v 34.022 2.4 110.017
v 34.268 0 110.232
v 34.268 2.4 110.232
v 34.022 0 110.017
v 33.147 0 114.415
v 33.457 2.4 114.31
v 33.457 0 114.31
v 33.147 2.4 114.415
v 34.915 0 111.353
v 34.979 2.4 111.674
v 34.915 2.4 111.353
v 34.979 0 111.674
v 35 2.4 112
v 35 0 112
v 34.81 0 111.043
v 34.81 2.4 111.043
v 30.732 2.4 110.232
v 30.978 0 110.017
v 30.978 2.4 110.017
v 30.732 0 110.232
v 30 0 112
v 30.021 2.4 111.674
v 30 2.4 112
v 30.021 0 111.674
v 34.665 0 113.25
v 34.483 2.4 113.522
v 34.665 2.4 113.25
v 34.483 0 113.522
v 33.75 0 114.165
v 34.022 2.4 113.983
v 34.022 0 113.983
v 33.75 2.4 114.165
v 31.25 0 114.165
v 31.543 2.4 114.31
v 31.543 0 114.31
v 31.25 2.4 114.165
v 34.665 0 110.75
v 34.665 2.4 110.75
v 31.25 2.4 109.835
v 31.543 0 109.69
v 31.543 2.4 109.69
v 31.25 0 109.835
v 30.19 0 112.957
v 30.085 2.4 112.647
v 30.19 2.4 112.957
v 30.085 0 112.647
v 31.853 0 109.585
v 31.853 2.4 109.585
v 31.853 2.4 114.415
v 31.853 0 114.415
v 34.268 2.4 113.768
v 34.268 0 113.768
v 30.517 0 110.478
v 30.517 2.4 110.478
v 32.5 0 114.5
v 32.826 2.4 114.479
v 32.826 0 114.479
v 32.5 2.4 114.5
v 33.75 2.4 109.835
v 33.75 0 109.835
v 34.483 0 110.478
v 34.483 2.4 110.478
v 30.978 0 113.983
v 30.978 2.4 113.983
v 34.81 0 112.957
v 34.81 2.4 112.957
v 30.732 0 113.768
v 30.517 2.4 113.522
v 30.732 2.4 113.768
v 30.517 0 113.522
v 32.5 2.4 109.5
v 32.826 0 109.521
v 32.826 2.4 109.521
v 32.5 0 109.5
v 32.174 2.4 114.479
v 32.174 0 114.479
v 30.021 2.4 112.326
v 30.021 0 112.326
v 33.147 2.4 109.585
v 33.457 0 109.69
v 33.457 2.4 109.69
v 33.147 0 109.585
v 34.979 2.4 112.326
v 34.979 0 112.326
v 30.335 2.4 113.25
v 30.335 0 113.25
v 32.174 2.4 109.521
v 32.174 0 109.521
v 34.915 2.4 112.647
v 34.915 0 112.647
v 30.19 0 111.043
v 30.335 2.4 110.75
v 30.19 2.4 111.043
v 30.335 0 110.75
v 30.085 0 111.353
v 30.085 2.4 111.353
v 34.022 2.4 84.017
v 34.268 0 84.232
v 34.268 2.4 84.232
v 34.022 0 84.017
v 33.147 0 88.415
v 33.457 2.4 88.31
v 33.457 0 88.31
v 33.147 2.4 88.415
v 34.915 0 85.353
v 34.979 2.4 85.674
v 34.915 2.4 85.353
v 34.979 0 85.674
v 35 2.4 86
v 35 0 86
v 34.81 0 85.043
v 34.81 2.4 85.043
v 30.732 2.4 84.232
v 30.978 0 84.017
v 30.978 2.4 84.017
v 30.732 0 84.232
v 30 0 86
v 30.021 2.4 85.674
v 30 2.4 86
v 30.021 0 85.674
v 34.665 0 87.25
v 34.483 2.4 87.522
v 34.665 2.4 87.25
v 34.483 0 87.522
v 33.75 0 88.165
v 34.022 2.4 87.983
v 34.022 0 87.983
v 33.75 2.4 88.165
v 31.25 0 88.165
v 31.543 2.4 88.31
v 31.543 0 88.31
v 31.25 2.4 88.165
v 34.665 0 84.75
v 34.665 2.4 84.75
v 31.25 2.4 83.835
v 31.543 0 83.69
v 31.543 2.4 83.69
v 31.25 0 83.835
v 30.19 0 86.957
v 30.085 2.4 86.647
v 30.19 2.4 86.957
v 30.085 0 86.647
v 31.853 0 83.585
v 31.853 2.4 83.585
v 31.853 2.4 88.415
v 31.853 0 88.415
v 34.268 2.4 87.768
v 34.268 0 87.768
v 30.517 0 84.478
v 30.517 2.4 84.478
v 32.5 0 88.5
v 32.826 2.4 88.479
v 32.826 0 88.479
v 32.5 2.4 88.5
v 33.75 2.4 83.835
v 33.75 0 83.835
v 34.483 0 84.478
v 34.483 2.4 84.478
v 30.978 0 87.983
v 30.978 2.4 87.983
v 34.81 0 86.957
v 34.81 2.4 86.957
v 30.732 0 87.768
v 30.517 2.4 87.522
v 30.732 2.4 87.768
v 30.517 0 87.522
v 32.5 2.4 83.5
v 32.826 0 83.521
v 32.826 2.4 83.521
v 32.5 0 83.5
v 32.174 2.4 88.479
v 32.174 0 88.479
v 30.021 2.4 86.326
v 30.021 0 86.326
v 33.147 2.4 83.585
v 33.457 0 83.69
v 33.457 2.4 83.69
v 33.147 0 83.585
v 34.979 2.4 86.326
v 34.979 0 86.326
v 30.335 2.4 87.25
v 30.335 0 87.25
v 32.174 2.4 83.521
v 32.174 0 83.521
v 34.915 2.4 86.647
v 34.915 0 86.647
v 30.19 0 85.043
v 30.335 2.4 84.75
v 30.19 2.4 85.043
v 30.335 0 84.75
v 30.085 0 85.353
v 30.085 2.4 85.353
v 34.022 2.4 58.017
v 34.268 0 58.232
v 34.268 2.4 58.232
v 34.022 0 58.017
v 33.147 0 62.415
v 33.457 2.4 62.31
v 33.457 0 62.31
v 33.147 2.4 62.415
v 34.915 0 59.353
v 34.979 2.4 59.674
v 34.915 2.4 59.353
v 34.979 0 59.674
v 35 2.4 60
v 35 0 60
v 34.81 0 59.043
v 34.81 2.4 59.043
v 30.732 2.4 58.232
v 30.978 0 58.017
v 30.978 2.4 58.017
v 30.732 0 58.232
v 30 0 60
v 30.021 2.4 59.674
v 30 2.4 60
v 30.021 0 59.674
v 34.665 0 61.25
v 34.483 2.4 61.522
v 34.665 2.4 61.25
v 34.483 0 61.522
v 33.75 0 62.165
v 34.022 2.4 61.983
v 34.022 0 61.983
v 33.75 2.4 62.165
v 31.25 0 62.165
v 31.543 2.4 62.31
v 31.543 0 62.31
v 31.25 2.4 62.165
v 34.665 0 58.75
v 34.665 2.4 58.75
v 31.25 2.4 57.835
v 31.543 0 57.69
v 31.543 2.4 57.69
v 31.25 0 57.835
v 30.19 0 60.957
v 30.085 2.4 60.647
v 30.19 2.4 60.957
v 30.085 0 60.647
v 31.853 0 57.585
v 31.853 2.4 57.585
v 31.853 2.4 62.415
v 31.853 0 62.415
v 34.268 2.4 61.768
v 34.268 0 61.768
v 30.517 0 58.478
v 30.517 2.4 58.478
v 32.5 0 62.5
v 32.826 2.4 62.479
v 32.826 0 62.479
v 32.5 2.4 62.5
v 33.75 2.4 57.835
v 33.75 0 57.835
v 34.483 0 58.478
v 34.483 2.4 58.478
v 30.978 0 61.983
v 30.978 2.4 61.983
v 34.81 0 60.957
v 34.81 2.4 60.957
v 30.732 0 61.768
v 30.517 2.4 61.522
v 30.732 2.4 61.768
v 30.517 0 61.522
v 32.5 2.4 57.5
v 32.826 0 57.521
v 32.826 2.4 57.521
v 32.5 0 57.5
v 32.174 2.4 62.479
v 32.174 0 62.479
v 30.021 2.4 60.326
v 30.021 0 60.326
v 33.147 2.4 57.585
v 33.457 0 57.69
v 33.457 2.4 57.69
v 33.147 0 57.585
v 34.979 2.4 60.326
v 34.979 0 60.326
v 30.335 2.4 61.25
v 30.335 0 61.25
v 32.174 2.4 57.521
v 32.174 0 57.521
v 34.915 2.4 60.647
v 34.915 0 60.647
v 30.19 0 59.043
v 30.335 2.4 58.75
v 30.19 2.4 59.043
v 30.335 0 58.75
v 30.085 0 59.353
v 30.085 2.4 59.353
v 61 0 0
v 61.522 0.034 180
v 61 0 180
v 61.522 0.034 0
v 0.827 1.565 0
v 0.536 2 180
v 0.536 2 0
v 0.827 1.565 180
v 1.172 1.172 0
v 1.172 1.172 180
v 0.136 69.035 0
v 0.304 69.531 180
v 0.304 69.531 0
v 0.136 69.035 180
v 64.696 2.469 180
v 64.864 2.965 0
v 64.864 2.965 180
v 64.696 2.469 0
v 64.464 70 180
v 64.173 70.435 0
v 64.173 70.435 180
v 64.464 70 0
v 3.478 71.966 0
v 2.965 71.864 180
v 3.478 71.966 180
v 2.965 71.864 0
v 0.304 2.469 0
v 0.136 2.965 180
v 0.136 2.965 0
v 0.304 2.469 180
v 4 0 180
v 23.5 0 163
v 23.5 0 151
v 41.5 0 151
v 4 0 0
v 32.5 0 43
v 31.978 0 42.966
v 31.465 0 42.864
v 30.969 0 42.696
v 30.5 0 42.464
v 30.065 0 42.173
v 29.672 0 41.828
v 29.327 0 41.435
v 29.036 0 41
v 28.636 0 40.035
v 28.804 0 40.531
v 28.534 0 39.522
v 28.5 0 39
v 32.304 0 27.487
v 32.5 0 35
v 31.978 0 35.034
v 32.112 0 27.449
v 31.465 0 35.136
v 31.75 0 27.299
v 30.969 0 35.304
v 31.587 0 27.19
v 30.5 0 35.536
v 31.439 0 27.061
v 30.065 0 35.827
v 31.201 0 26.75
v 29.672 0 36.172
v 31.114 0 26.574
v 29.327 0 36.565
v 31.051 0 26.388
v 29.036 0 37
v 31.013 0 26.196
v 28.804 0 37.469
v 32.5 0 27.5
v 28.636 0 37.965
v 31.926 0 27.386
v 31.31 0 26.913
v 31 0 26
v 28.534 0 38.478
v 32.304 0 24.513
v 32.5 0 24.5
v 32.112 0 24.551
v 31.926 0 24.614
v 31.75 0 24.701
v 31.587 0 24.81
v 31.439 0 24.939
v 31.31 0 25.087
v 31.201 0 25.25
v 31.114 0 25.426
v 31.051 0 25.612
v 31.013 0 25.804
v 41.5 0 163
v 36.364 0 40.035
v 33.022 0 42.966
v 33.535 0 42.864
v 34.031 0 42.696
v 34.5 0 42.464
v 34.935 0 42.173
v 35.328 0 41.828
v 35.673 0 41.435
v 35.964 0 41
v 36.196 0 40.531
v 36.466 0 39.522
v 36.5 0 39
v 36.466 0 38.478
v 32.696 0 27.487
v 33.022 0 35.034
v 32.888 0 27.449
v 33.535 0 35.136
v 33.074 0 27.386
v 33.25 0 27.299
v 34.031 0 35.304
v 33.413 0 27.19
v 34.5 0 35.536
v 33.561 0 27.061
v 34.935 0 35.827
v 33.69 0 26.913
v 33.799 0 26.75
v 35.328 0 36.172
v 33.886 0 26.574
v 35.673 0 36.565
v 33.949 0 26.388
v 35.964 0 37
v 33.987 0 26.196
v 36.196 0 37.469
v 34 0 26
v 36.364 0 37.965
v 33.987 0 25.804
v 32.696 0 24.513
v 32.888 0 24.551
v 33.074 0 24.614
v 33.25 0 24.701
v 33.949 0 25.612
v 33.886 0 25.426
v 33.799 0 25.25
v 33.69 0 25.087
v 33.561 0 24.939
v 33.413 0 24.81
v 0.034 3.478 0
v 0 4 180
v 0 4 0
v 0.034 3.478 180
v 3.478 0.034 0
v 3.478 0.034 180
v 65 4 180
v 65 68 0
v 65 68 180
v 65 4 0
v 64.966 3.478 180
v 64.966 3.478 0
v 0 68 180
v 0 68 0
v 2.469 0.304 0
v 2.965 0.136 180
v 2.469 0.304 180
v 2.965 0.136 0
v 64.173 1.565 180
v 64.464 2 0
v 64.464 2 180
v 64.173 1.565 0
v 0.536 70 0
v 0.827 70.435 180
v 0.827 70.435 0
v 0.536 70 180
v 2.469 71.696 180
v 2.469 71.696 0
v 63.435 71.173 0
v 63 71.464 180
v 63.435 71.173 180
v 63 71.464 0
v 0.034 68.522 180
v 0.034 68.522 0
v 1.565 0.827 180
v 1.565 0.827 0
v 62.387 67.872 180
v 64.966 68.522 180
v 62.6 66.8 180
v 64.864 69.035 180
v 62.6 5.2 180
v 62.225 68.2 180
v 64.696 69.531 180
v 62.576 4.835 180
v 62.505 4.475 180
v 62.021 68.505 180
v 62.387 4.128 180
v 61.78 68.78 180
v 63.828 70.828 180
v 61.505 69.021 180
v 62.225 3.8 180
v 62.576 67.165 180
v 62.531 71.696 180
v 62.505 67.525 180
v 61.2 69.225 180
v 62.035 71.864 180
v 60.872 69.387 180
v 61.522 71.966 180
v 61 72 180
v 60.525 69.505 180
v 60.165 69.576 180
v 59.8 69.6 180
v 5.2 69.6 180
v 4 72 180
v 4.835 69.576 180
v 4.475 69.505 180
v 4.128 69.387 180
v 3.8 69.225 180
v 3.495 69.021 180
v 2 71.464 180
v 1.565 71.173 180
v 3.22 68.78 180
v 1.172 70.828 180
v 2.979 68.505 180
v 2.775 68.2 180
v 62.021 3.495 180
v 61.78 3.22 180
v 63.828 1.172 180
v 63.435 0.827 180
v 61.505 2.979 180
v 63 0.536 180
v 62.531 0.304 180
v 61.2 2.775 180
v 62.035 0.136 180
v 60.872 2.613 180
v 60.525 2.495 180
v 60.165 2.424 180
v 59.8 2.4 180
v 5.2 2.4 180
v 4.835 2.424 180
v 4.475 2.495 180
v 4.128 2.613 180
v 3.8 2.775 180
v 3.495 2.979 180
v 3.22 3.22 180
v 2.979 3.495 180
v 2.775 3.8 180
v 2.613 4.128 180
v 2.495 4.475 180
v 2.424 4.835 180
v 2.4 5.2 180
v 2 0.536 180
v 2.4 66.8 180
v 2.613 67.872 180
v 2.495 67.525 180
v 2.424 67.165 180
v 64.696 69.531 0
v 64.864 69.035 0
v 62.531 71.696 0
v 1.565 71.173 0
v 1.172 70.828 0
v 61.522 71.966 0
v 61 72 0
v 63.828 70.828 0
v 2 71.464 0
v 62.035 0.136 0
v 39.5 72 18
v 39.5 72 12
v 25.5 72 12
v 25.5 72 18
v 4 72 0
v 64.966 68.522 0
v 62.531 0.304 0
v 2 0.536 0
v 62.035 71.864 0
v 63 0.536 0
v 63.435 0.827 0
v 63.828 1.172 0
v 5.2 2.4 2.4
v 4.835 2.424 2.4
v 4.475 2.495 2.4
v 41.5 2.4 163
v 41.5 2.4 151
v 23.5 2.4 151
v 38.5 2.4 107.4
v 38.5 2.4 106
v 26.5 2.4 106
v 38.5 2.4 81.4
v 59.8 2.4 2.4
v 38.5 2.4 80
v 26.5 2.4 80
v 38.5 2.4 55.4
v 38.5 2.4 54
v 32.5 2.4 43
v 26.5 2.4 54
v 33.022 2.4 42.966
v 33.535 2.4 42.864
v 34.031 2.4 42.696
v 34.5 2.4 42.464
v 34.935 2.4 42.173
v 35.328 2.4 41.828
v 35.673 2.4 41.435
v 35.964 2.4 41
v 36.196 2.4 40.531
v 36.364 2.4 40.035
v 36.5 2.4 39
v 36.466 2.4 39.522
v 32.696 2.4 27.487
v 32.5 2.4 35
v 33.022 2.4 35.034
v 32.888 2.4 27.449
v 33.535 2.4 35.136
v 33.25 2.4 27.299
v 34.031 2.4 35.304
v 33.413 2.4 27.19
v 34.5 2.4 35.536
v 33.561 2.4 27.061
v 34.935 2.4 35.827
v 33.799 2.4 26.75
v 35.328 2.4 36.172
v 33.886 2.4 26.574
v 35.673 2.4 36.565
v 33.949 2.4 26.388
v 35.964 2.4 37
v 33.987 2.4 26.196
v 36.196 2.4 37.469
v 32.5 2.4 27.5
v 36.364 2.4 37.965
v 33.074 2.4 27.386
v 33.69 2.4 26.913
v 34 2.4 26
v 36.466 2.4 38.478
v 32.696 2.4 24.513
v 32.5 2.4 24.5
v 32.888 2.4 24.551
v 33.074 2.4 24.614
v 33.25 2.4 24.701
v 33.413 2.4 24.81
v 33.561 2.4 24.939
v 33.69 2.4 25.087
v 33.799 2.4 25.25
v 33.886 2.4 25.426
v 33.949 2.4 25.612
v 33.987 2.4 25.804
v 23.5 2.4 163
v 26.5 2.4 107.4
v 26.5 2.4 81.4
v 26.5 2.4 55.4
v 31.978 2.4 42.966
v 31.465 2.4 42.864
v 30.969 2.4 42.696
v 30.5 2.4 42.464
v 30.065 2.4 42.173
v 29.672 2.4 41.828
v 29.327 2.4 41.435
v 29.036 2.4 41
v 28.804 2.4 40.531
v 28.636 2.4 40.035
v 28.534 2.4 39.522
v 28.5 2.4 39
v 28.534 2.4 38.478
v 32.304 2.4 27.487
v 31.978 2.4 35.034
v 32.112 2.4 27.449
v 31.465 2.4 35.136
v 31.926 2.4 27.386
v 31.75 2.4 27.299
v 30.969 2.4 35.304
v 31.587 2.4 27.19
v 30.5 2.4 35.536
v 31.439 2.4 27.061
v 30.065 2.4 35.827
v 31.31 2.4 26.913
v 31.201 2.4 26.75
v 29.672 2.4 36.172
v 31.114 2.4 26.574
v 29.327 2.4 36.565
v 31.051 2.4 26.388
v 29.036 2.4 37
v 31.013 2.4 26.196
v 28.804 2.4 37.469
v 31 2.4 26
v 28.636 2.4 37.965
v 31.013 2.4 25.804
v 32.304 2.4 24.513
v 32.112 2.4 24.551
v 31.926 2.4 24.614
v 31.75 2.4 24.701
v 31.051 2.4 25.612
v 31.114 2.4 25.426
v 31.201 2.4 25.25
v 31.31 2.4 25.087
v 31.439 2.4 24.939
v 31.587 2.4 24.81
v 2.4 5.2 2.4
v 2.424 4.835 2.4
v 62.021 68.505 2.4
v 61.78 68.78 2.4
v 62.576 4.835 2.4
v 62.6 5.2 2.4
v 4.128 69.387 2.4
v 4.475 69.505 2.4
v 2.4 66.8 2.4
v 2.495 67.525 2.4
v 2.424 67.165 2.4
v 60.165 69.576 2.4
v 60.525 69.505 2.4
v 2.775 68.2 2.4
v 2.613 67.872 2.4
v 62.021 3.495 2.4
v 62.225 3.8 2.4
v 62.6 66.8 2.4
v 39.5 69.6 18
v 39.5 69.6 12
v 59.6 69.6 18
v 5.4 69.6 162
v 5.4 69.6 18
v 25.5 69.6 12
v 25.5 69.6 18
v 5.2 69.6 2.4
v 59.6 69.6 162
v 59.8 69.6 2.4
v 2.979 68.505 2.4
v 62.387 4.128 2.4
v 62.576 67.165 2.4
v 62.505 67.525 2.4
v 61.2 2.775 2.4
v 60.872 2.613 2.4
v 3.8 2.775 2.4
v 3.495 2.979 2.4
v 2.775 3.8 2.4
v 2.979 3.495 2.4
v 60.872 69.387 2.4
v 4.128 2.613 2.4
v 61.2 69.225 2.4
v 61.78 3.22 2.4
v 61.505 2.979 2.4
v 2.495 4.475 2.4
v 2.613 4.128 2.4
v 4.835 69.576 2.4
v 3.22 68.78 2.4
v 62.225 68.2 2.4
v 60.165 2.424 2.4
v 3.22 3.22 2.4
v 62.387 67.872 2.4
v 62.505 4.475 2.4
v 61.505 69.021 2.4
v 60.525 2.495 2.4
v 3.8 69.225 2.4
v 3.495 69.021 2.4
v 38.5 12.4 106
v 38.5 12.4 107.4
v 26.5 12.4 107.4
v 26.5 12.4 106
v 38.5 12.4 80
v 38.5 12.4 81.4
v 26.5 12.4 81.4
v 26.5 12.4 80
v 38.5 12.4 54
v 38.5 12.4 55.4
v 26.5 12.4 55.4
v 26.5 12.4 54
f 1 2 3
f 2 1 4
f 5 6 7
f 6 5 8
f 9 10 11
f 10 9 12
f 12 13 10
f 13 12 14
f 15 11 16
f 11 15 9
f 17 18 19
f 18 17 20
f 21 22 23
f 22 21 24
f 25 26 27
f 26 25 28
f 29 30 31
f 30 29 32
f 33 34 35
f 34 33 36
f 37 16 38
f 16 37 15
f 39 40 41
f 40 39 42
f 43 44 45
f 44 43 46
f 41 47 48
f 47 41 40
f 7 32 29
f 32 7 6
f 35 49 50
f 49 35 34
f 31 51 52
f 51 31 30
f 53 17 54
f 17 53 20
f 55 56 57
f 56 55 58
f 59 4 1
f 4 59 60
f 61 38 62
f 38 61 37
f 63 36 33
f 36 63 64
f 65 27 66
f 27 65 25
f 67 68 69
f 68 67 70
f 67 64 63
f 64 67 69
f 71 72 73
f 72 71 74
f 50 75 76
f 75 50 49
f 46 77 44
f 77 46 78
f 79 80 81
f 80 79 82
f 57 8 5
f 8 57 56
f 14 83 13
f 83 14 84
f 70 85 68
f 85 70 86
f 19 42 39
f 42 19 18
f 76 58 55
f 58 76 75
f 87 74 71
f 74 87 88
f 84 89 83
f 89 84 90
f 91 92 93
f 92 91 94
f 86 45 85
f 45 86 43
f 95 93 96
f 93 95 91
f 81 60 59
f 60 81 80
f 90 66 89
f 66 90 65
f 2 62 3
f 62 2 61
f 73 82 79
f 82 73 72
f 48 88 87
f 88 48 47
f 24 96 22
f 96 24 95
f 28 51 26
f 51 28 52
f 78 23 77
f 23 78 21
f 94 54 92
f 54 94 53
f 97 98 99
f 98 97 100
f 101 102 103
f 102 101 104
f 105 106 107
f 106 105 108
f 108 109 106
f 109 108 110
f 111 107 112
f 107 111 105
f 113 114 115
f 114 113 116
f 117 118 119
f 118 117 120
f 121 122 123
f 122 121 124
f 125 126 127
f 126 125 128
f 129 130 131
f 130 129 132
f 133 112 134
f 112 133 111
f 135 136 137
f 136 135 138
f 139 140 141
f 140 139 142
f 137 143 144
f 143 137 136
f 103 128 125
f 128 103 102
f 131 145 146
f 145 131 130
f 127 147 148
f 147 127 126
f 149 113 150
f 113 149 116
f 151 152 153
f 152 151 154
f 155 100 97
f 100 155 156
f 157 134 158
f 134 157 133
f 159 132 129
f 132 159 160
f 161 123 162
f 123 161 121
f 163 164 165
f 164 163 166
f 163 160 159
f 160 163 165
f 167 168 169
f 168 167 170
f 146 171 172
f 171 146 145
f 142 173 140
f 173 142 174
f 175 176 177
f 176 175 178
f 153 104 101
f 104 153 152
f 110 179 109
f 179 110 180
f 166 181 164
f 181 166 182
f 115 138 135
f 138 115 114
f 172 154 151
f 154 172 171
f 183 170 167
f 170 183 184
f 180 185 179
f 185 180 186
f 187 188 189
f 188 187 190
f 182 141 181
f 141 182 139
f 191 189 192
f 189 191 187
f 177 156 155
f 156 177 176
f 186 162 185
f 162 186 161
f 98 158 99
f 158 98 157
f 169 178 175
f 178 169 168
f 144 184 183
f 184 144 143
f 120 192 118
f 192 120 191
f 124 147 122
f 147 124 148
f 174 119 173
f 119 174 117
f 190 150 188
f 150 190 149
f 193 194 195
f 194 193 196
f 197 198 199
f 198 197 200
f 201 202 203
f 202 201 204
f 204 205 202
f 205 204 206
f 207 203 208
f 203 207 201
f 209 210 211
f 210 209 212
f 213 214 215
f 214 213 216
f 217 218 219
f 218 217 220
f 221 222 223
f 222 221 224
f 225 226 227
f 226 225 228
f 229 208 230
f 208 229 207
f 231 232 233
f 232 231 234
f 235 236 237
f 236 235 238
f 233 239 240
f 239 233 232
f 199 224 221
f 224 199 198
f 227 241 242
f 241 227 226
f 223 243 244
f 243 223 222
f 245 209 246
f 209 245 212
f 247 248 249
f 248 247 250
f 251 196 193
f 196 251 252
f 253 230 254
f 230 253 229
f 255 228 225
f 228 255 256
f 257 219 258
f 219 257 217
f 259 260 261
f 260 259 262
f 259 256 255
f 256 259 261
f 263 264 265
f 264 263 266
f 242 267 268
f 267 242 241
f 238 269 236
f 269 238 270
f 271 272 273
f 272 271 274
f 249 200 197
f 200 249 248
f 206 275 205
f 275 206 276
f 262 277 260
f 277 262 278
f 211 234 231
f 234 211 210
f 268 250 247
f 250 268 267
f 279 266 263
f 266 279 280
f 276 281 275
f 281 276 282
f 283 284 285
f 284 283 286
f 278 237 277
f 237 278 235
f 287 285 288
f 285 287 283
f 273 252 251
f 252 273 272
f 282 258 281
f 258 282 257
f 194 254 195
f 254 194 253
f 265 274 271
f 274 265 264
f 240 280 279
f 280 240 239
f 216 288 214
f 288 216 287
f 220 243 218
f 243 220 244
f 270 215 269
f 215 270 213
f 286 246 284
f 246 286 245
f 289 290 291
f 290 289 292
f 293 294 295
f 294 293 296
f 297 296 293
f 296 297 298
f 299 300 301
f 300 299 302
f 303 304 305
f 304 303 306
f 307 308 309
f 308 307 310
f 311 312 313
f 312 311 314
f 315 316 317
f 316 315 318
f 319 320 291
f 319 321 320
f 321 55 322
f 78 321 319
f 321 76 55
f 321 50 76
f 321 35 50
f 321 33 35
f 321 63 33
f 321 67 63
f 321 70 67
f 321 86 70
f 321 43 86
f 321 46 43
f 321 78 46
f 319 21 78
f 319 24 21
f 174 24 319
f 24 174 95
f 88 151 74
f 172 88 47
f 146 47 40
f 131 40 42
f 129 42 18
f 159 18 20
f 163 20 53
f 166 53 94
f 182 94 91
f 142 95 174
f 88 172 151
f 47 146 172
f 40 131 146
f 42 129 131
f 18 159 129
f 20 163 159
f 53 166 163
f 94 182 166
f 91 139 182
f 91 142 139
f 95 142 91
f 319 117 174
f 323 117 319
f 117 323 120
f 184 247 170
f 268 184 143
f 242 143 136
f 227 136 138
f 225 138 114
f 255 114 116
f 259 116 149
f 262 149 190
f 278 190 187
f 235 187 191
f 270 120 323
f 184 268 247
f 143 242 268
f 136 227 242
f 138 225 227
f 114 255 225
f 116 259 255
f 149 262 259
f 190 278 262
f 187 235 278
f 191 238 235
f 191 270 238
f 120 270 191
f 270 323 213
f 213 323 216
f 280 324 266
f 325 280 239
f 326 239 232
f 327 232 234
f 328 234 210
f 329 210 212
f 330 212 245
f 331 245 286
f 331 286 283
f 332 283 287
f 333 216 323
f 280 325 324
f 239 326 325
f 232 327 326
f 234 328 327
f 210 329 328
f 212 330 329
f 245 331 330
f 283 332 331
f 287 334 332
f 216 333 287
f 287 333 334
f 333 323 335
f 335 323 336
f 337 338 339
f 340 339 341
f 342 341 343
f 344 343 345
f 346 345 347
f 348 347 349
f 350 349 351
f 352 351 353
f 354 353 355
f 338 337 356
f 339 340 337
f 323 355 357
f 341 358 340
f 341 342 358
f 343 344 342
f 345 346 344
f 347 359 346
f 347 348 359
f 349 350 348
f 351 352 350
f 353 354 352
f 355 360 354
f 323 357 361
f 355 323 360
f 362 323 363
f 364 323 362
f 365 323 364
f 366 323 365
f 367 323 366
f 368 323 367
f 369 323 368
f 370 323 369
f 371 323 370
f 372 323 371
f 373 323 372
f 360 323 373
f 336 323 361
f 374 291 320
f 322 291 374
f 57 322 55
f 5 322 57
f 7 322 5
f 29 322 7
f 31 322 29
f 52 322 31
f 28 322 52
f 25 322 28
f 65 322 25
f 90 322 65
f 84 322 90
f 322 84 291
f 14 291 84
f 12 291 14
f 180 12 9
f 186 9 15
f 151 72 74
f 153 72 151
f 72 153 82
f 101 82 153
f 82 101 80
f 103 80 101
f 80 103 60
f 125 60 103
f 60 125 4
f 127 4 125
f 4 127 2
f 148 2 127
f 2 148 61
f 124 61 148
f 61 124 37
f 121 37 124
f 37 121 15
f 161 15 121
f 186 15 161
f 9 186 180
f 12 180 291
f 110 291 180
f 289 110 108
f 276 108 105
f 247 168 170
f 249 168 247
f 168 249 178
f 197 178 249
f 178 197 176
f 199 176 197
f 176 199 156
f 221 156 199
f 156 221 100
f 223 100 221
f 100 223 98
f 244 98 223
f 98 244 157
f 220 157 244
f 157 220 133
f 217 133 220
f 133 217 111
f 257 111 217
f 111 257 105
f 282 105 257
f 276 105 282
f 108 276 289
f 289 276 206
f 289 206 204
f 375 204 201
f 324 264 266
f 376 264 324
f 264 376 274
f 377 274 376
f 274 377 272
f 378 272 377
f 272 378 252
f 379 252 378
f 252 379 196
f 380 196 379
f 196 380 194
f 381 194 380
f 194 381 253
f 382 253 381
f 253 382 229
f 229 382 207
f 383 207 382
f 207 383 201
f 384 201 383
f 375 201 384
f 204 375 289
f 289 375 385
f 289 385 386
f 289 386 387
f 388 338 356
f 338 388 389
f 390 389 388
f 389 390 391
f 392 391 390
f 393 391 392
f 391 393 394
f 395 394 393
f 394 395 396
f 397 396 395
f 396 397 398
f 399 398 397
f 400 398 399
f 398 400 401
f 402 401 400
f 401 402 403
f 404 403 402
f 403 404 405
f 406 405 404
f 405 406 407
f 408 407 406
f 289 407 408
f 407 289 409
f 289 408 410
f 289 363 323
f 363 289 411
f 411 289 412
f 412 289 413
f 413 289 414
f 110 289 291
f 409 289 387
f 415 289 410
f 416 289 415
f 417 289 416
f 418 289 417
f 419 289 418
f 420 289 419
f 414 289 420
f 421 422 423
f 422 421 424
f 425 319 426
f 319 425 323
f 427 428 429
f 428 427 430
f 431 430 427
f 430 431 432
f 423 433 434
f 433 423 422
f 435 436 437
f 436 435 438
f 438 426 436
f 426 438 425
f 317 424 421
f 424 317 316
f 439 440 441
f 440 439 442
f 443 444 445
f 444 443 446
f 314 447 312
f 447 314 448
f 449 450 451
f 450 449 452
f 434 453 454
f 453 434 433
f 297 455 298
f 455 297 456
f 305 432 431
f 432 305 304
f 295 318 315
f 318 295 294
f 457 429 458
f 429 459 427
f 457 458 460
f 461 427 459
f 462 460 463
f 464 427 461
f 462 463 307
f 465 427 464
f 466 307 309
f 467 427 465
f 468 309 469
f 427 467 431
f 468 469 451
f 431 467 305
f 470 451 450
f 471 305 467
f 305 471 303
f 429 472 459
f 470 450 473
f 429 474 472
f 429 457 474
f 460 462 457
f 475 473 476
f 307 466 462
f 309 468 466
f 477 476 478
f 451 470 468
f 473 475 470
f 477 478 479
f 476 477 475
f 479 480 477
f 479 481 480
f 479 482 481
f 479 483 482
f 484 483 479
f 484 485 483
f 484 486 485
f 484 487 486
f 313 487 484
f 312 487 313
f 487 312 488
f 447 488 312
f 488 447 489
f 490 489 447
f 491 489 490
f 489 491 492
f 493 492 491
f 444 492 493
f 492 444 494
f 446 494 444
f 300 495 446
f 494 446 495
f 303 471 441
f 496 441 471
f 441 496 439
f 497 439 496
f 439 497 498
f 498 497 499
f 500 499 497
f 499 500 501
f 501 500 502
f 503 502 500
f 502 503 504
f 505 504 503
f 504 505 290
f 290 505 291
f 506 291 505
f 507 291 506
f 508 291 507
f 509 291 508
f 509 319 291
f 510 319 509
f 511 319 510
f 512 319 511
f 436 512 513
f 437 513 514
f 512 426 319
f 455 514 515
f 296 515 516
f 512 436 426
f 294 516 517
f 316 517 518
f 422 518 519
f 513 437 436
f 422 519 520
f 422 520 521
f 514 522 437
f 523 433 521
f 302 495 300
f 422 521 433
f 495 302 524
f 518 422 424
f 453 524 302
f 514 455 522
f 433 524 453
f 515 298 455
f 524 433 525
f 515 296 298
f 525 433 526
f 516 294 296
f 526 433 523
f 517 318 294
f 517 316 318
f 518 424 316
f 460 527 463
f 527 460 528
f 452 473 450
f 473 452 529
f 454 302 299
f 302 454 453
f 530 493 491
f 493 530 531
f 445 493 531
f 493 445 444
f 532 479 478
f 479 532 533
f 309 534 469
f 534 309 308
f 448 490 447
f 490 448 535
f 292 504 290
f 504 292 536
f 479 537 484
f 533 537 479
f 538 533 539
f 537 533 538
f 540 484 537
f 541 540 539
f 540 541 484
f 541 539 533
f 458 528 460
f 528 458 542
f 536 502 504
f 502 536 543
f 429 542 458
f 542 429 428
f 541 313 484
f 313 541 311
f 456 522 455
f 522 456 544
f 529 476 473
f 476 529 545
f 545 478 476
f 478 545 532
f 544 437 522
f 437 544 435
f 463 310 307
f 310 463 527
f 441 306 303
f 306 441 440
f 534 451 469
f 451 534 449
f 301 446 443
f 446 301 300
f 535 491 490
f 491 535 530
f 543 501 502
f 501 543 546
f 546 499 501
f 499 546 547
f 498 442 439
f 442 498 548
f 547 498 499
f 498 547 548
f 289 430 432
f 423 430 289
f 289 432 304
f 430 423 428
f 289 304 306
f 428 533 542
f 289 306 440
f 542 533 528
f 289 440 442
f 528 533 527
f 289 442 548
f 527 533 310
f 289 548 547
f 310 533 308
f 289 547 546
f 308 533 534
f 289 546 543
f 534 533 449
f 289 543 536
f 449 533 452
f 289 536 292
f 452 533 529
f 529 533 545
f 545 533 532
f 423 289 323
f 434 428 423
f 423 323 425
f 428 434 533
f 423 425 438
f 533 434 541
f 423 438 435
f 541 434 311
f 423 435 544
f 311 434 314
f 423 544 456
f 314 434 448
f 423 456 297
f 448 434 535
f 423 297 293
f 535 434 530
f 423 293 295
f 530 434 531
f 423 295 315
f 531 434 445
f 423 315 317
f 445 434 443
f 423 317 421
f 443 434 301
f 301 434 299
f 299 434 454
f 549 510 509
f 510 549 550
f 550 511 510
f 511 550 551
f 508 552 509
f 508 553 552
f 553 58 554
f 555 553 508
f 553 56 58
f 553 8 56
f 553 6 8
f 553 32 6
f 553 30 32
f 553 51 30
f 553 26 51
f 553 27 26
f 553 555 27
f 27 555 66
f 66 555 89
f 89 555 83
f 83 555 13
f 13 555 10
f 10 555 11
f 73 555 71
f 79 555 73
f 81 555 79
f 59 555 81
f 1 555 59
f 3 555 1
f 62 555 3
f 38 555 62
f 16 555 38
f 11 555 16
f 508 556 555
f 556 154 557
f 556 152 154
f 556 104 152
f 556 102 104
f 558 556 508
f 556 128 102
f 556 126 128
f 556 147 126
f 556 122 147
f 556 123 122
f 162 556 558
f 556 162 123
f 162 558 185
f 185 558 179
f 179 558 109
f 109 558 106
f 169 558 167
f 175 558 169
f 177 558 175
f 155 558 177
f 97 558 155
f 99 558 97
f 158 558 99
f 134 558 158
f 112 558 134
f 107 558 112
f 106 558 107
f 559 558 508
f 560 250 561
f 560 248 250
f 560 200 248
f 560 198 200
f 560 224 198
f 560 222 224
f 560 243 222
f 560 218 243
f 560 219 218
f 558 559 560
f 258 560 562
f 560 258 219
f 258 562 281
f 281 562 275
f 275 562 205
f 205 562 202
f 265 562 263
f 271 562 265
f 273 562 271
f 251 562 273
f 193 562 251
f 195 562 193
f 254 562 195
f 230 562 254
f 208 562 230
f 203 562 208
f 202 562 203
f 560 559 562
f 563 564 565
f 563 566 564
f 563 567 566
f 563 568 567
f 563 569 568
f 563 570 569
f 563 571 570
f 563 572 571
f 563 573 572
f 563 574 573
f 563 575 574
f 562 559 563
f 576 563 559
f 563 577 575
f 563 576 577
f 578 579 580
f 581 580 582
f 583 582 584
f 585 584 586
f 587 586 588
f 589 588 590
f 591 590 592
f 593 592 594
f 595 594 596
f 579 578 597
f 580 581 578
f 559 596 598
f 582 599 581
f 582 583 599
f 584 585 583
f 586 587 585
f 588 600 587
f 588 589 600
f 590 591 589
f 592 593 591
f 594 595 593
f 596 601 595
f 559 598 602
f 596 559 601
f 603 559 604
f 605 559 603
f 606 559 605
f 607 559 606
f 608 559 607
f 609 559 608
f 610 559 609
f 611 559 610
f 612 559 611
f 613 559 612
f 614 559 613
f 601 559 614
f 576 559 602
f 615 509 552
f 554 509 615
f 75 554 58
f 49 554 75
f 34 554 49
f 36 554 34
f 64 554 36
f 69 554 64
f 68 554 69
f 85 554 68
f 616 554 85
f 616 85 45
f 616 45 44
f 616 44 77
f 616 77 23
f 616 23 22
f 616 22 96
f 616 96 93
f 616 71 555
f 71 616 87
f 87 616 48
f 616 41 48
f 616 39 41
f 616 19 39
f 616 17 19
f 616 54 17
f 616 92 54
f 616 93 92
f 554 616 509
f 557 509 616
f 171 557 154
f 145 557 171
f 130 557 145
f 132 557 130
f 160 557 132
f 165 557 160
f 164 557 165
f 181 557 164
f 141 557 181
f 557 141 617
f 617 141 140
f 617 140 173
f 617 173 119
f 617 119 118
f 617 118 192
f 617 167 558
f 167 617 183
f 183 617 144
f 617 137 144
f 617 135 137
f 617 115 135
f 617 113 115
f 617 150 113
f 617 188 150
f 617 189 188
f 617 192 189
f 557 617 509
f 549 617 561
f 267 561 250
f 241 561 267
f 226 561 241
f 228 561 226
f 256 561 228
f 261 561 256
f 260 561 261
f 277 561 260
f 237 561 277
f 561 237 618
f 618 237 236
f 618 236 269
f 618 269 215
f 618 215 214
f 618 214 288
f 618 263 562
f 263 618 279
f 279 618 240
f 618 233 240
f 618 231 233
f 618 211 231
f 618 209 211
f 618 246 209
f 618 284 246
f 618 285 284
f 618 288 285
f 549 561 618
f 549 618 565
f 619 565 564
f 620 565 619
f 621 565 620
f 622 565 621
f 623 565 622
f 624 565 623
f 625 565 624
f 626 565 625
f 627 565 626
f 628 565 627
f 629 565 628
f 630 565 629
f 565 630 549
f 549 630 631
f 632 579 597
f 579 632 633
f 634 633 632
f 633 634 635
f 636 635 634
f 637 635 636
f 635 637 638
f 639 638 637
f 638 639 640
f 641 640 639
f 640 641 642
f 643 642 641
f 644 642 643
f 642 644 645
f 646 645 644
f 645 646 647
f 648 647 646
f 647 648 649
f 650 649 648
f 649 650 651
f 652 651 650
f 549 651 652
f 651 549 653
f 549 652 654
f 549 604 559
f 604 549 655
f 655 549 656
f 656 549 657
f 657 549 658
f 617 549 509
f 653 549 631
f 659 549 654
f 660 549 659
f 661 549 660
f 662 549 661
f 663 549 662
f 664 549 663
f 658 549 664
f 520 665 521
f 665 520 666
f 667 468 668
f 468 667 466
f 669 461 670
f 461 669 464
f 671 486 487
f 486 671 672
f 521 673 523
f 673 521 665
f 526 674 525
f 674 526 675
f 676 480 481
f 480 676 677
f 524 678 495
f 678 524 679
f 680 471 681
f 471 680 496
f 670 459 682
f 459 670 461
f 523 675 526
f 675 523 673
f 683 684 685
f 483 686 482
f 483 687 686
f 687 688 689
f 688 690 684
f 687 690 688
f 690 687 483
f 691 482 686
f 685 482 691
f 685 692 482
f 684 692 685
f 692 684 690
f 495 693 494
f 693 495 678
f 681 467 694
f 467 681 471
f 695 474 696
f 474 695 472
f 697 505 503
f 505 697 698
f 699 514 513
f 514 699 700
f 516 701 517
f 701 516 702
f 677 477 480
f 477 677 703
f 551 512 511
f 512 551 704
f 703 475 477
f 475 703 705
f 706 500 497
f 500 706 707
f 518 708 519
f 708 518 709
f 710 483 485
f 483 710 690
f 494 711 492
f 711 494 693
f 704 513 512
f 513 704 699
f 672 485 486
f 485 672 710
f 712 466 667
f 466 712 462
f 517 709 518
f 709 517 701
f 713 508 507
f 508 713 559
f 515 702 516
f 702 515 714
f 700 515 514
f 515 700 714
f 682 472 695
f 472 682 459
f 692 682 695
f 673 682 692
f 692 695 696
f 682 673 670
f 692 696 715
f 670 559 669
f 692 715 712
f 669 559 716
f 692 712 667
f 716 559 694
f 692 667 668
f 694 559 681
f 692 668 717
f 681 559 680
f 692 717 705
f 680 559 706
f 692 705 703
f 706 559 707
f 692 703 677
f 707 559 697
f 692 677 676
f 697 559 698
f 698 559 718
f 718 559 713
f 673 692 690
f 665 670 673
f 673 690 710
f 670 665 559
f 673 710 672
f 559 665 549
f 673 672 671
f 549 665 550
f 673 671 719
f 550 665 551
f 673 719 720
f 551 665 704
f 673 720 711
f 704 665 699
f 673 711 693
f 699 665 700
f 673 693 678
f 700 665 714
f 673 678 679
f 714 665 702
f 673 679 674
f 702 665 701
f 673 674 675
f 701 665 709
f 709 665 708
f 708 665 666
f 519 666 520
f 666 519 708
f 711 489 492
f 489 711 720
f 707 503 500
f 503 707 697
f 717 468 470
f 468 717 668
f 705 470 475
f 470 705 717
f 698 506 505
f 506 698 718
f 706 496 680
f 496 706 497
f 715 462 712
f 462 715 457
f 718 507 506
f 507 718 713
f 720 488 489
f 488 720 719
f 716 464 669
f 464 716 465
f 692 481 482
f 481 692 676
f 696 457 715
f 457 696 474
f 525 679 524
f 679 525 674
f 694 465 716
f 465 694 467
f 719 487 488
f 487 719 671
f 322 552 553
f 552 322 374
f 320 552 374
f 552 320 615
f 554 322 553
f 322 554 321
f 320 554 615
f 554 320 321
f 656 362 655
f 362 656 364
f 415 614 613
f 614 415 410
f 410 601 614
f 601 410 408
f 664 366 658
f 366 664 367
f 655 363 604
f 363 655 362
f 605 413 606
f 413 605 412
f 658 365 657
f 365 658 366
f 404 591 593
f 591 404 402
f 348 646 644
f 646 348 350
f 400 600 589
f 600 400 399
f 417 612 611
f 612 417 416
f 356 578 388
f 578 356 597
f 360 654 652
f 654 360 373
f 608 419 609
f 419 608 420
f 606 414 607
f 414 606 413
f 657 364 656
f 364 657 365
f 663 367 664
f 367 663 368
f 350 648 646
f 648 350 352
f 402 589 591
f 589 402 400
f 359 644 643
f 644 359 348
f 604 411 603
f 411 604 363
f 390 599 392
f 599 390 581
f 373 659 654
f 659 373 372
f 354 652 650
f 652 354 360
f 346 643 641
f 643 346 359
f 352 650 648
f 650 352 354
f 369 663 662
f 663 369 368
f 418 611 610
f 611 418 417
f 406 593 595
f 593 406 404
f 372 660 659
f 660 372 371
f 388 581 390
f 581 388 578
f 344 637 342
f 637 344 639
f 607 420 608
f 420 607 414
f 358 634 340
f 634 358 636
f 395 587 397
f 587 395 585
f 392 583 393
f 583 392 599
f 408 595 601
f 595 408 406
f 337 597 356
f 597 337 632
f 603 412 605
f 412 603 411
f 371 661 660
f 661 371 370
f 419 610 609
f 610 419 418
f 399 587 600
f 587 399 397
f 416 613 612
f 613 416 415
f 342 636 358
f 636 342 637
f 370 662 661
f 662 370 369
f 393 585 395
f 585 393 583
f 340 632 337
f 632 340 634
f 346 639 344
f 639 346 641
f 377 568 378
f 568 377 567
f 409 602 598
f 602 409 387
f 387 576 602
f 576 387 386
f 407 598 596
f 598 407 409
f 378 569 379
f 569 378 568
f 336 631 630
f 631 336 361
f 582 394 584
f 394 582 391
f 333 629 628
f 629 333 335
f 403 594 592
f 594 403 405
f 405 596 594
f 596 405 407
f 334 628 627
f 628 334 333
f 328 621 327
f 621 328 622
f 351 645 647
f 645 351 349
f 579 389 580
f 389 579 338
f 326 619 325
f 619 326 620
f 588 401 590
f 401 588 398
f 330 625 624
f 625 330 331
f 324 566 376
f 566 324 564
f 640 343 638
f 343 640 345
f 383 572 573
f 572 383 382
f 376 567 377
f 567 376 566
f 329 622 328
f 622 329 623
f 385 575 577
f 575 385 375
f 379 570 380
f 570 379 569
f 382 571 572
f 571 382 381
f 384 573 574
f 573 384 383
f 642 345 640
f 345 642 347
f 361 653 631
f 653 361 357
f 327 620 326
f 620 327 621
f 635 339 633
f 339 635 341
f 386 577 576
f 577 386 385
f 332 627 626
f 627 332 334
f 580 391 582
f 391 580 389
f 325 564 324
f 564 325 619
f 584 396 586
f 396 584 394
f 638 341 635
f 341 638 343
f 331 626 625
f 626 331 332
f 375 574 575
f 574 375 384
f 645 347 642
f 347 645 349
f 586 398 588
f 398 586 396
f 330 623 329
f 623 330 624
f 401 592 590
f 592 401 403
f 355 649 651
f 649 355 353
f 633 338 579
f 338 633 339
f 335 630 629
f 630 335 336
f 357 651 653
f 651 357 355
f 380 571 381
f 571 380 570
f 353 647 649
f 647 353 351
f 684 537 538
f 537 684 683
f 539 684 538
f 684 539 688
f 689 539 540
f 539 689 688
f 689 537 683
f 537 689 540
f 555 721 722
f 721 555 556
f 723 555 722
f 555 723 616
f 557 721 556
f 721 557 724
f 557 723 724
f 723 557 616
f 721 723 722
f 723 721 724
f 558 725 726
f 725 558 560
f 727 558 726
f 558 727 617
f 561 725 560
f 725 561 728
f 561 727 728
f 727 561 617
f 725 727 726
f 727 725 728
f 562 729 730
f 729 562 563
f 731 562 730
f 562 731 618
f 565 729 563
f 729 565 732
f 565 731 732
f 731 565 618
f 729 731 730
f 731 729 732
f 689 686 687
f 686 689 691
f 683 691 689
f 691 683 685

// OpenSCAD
// Posturely slim-column concept. Measure purchased parts before STL export.
$fn = 48;

part = "assembly"; // "body", "rear_panel", or "assembly"
column_height = 180;
column_width = 65;
column_depth = 72;
wall = 2.4;
corner_radius = 4;
panel_thickness = 2.4;

camera_width = 18;
camera_height = 12;
camera_z = 151;
diagnostic_diameter = 5;
diagnostic_z = [112, 86, 60];
monitor_diameter = 3;
button_diameter = 8;
usb_width = 14;
usb_height = 8;
ballast_width = 48;
ballast_depth = 48;
ballast_height = 7;

module rounded_box(size, radius) {
    hull() {
        for (x = [radius, size[0] - radius])
            for (y = [radius, size[1] - radius])
                translate([x, y, 0])
                    cylinder(h = size[2], r = radius);
    }
}

module camera_cutout() {
    translate([(column_width-camera_width)/2, -1, camera_z])
        cube([camera_width, wall+2, camera_height]);
}

module diagnostic_apertures() {
    for (z = diagnostic_z)
        translate([column_width/2, -1, z])
            rotate([-90, 0, 0])
                cylinder(h = wall+2, d = diagnostic_diameter);
}

module monitor_aperture() {
    translate([column_width/2, -1, 26])
        rotate([-90, 0, 0])
            cylinder(h = wall+2, d = monitor_diameter);
}

module button_cutout() {
    translate([column_width/2, -1, 39])
        rotate([-90, 0, 0])
            cylinder(h = wall+2, d = button_diameter);
}

module usb_c_cutout() {
    translate([(column_width-usb_width)/2, column_depth-wall-1, 12])
        cube([usb_width, wall+2, usb_height]);
}

module ventilation() {
    for (x = [15:7:50])
        translate([x, column_depth-wall-1, 105])
            cube([3, wall+2, 32]);
}

module ballast_pocket() {
    translate([(column_width-ballast_width)/2,
               (column_depth-ballast_depth)/2, wall])
        cube([ballast_width, ballast_depth, ballast_height]);
}

module body() {
    difference() {
        rounded_box([column_width, column_depth, column_height], corner_radius);
        translate([wall, wall, wall])
            rounded_box([column_width-2*wall,
                         column_depth-2*wall,
                         column_height], corner_radius-wall/2);
        camera_cutout();
        diagnostic_apertures();
        monitor_aperture();
        button_cutout();
        usb_c_cutout();
        ventilation();
        ballast_pocket();
        translate([wall+3, column_depth-wall-1, 18])
            cube([column_width-2*wall-6, wall+2, column_height-36]);
    }
    light_barriers();
}

module light_barriers() {
    for (z = diagnostic_z)
        translate([column_width/2-6, wall, z-6])
            cube([12, 10, 1.4]);
}

module rear_panel() {
    translate([wall+3, 0, 18])
        cube([column_width-2*wall-6, panel_thickness, column_height-36]);
}

if (part == "body")
    body();
else if (part == "rear_panel")
    rear_panel();
else {
    body();
    translate([0, column_depth-panel_thickness, 0])
        rear_panel();
}
